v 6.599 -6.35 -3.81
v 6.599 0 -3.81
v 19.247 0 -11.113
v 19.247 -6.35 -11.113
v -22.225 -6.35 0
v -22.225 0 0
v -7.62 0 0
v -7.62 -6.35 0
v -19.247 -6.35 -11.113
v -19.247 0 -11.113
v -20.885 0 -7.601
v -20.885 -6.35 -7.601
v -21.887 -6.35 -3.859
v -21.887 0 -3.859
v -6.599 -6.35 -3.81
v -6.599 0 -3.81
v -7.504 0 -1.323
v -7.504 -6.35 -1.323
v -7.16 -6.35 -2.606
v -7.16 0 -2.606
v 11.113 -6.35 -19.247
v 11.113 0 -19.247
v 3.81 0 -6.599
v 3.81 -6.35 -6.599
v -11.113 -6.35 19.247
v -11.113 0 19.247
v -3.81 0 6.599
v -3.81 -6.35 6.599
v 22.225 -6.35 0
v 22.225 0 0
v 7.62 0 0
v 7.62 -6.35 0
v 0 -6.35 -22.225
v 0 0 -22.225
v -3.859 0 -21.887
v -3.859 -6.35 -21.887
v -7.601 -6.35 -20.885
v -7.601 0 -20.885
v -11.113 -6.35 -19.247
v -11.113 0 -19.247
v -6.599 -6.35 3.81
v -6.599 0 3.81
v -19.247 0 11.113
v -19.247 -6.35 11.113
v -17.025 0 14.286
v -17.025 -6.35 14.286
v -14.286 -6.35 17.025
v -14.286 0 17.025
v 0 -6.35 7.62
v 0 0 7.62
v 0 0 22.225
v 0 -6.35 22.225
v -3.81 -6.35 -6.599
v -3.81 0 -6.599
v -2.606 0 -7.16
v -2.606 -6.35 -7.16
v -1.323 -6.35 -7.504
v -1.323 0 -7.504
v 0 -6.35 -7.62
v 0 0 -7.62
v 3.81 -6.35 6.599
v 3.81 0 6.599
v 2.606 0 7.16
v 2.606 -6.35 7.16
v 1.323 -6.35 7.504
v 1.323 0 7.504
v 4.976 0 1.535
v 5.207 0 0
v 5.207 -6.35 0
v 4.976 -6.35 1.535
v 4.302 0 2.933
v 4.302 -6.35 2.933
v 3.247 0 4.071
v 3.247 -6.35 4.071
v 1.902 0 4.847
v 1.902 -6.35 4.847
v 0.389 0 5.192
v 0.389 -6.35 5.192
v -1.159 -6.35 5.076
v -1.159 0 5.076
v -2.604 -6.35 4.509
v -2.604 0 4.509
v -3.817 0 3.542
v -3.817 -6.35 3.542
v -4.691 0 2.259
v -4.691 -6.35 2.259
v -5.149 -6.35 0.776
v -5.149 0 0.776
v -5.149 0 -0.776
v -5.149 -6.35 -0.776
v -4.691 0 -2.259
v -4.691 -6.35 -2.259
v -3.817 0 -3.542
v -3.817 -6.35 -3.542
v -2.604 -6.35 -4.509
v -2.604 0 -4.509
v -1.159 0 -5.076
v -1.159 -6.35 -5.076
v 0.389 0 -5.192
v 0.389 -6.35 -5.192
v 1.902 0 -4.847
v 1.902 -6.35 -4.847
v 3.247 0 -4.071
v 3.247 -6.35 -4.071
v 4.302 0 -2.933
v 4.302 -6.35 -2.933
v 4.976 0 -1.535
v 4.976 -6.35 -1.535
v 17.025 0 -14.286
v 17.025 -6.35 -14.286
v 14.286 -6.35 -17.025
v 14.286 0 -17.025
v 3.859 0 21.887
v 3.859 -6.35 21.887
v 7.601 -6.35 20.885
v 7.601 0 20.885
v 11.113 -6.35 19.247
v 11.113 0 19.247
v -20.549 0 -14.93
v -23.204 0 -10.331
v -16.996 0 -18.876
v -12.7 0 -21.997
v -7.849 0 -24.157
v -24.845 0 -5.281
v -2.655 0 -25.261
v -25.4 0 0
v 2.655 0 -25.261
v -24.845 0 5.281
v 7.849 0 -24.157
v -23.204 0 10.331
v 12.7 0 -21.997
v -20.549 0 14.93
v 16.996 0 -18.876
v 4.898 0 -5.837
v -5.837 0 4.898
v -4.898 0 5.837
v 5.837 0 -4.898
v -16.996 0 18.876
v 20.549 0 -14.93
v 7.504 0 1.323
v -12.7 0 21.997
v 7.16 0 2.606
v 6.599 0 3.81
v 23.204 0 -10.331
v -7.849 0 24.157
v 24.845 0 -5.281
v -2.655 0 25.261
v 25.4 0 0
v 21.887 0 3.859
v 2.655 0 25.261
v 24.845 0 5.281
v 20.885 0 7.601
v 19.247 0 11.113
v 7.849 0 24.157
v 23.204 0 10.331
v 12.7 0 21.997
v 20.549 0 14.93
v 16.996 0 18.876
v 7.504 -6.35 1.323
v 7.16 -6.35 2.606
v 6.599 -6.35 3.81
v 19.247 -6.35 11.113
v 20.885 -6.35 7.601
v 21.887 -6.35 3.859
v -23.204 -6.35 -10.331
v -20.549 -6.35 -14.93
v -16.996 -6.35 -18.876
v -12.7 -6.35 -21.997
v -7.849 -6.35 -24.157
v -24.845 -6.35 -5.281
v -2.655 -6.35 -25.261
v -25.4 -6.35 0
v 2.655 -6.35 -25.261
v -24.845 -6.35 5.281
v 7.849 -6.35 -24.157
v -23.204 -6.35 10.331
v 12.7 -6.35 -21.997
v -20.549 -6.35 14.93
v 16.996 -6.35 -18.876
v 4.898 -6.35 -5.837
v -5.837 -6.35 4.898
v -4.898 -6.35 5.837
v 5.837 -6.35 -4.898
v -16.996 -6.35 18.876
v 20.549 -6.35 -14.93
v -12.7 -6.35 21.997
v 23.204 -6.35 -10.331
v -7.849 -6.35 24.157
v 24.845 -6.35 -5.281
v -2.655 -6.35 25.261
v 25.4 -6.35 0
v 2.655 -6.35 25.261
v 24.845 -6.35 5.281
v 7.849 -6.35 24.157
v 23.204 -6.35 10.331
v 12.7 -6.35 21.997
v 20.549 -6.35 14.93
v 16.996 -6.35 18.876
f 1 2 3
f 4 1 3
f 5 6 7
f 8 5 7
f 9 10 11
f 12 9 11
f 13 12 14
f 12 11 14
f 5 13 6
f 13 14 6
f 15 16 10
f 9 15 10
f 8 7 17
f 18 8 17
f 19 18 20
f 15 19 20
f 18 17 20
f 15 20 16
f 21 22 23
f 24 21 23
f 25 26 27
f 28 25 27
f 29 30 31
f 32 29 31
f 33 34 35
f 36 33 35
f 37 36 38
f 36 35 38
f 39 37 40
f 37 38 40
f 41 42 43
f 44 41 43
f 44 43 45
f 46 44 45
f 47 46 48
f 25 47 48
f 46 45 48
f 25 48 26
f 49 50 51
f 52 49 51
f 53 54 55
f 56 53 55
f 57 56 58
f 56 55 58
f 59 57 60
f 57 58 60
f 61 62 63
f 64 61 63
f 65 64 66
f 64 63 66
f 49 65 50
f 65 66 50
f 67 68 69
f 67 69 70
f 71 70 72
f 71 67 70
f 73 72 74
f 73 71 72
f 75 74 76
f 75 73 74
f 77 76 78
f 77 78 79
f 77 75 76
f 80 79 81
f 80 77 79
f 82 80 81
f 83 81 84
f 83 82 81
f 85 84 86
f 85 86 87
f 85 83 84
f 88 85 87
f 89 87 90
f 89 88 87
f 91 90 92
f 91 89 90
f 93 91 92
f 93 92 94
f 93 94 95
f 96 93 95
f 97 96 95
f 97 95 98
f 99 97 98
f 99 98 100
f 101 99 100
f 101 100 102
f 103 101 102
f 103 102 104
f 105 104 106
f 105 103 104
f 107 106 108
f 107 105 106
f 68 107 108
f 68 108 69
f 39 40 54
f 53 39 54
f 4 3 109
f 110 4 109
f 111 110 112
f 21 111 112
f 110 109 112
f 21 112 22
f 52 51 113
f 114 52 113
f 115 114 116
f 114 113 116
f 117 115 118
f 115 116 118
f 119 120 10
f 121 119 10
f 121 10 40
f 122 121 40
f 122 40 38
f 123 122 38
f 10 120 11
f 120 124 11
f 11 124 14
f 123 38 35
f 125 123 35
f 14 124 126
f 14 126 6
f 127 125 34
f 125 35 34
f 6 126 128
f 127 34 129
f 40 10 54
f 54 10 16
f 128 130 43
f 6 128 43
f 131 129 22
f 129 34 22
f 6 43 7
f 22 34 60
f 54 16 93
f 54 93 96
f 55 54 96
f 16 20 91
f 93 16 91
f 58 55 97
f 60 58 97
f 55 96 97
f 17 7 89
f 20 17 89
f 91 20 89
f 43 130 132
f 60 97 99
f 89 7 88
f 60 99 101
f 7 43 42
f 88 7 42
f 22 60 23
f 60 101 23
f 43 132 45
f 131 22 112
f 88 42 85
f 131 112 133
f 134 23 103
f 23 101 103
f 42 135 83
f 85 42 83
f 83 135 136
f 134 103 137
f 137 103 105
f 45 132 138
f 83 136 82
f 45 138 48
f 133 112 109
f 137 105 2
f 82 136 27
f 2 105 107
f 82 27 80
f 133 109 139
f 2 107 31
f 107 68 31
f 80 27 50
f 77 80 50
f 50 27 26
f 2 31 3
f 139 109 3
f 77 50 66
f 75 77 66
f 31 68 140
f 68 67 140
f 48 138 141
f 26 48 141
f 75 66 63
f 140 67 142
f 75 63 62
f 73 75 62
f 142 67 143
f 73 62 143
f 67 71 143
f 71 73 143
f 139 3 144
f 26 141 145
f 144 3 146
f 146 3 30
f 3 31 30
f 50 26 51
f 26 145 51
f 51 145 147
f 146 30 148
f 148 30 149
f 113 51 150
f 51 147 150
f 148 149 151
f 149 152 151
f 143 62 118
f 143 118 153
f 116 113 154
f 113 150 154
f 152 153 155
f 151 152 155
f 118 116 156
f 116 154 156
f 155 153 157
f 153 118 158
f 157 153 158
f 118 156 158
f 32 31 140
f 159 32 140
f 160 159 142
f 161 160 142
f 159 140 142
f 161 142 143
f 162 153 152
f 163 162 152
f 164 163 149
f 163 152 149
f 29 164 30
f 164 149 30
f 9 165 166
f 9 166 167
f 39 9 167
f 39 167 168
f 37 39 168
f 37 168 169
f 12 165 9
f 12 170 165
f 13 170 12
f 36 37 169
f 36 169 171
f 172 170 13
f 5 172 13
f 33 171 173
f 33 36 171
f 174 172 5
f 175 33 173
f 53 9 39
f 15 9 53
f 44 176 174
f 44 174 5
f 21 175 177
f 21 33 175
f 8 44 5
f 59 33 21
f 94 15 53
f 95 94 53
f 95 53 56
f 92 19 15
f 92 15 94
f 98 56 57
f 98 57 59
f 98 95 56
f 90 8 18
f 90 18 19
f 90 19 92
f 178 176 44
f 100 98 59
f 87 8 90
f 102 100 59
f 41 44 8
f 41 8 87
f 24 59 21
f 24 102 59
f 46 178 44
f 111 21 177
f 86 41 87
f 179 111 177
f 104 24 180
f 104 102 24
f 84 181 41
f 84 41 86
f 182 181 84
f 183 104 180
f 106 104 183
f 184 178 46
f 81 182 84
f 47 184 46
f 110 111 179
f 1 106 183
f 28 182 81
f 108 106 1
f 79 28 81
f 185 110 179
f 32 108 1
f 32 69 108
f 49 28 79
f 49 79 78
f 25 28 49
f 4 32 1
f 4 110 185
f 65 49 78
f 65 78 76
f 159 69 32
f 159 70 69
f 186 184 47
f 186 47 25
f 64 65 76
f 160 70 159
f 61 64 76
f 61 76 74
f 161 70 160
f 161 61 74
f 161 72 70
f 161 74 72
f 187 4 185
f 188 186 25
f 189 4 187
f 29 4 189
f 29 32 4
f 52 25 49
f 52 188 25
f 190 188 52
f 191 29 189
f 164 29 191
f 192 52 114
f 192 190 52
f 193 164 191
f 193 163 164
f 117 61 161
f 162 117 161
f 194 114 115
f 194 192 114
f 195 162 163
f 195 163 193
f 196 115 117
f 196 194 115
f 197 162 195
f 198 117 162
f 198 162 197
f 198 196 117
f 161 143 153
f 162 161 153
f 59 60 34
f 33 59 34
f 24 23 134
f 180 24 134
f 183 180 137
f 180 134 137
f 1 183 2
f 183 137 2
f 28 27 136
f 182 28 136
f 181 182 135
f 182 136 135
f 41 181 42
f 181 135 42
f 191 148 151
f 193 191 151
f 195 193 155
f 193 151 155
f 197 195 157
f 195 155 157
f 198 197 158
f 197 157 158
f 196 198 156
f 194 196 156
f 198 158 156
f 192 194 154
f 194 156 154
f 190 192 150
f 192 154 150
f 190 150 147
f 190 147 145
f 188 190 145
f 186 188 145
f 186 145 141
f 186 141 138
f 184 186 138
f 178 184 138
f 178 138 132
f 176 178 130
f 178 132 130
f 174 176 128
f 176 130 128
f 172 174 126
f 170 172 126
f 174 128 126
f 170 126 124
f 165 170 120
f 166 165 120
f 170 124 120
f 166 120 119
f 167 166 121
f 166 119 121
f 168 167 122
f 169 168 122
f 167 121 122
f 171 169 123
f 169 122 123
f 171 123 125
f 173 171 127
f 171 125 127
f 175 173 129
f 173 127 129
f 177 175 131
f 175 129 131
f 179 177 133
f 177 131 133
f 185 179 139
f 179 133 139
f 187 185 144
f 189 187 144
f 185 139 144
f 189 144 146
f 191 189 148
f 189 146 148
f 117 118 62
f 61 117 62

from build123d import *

# Parameters (mm, degrees)
F0_R     = 25.4
F0_R_2   = 5.207
F1_DEPTH = 6.35


with BuildPart() as f1:
    # F0 (on Front) → F1 (new body)
    with BuildSketch(Plane.XZ):
        Circle(F0_R)
        with BuildLine():
            ThreePointArc((19.2474145991, 11.1125), (21.4677014893, 5.7522532774), (22.225, 0))
            ThreePointArc((22.225, 0), (21.4677014893, -5.7522532774), (19.2474145991, -11.1125))
            ThreePointArc((19.2474145991, -11.1125), (15.7154482119, -15.7154482119), (11.1125, -19.2474145991))
            ThreePointArc((11.1125, -19.2474145991), (5.7522532774, -21.4677014893), (0, -22.225))
            ThreePointArc((0, -22.225), (-5.7522532774, -21.4677014893), (-11.1125, -19.2474145991))
            ThreePointArc((-11.1125, -19.2474145991), (-15.7154482119, -15.7154482119), (-19.2474145991, -11.1125))
            ThreePointArc((-19.2474145991, -11.1125), (-21.4677014893, -5.7522532774), (-22.225, 0))
            ThreePointArc((-22.225, 0), (-21.4677014893, 5.7522532774), (-19.2474145991, 11.1125))
            ThreePointArc((-19.2474145991, 11.1125), (-15.7154482119, 15.7154482119), (-11.1125, 19.2474145991))
            ThreePointArc((-11.1125, 19.2474145991), (-5.7522532774, 21.4677014893), (0, 22.225))
            ThreePointArc((0, 22.225), (5.7522532774, 21.4677014893), (11.1125, 19.2474145991))
            ThreePointArc((11.1125, 19.2474145991), (15.7154482119, 15.7154482119), (19.2474145991, 11.1125))
        make_face(mode=Mode.SUBTRACT)
        with BuildLine():
            ThreePointArc((6.5991135768, -3.81), (7.3603547963, -1.9722011237), (7.62, 0))
            ThreePointArc((7.62, 0), (7.3603547963, 1.9722011237), (6.5991135768, 3.81))
            ThreePointArc((6.5991135768, 3.81), (5.3881536726, 5.3881536726), (3.81, 6.5991135768))
            ThreePointArc((3.81, 6.5991135768), (1.9722011237, 7.3603547963), (0, 7.62))
            ThreePointArc((0, 7.62), (-1.9722011237, 7.3603547963), (-3.81, 6.5991135768))
            ThreePointArc((-3.81, 6.5991135768), (-5.3881536726, 5.3881536726), (-6.5991135768, 3.81))
            ThreePointArc((-6.5991135768, 3.81), (-7.3603547963, 1.9722011237), (-7.62, 0))
            ThreePointArc((-7.62, 0), (-7.3603547963, -1.9722011237), (-6.5991135768, -3.81))
            ThreePointArc((-6.5991135768, -3.81), (-5.3881536726, -5.3881536726), (-3.81, -6.5991135768))
            ThreePointArc((-3.81, -6.5991135768), (-1.9722011237, -7.3603547963), (0, -7.62))
            ThreePointArc((0, -7.62), (1.9722011237, -7.3603547963), (3.81, -6.5991135768))
            ThreePointArc((3.81, -6.5991135768), (5.3881536726, -5.3881536726), (6.5991135768, -3.81))
        make_face()
        Circle(F0_R_2, mode=Mode.SUBTRACT)
        with BuildLine():
            Line((6.5991135768, 3.81), (19.2474145991, 11.1125))
            ThreePointArc((19.2474145991, 11.1125), (15.7154482119, 15.7154482119), (11.1125, 19.2474145991))
            Line((11.1125, 19.2474145991), (3.81, 6.5991135768))
            ThreePointArc((3.81, 6.5991135768), (5.3881536726, 5.3881536726), (6.5991135768, 3.81))
        make_face()
        with BuildLine():
            Line((0, 7.62), (0, 22.225))
            ThreePointArc((0, 22.225), (-5.7522532774, 21.4677014893), (-11.1125, 19.2474145991))
            Line((-11.1125, 19.2474145991), (-3.81, 6.5991135768))
            ThreePointArc((-3.81, 6.5991135768), (-1.9722011237, 7.3603547963), (0, 7.62))
        make_face()
        with BuildLine():
            Line((-6.5991135768, 3.81), (-19.2474145991, 11.1125))
            ThreePointArc((-19.2474145991, 11.1125), (-21.4677014893, 5.7522532774), (-22.225, 0))
            Line((-22.225, 0), (-7.62, 0))
            ThreePointArc((-7.62, 0), (-7.3603547963, 1.9722011237), (-6.5991135768, 3.81))
        make_face()
        with BuildLine():
            ThreePointArc((-19.2474145991, -11.1125), (-15.7154482119, -15.7154482119), (-11.1125, -19.2474145991))
            Line((-11.1125, -19.2474145991), (-3.81, -6.5991135768))
            ThreePointArc((-3.81, -6.5991135768), (-5.3881536726, -5.3881536726), (-6.5991135768, -3.81))
            Line((-6.5991135768, -3.81), (-19.2474145991, -11.1125))
        make_face()
        with BuildLine():
            ThreePointArc((0, -22.225), (5.7522532774, -21.4677014893), (11.1125, -19.2474145991))
            Line((11.1125, -19.2474145991), (3.81, -6.5991135768))
            ThreePointArc((3.81, -6.5991135768), (1.9722011237, -7.3603547963), (0, -7.62))
            Line((0, -7.62), (0, -22.225))
        make_face()
        with BuildLine():
            ThreePointArc((19.2474145991, -11.1125), (21.4677014893, -5.7522532774), (22.225, 0))
            Line((22.225, 0), (7.62, 0))
            ThreePointArc((7.62, 0), (7.3603547963, -1.9722011237), (6.5991135768, -3.81))
            Line((6.5991135768, -3.81), (19.2474145991, -11.1125))
        make_face()
    extrude(amount=F1_DEPTH)


solid = f1.part
